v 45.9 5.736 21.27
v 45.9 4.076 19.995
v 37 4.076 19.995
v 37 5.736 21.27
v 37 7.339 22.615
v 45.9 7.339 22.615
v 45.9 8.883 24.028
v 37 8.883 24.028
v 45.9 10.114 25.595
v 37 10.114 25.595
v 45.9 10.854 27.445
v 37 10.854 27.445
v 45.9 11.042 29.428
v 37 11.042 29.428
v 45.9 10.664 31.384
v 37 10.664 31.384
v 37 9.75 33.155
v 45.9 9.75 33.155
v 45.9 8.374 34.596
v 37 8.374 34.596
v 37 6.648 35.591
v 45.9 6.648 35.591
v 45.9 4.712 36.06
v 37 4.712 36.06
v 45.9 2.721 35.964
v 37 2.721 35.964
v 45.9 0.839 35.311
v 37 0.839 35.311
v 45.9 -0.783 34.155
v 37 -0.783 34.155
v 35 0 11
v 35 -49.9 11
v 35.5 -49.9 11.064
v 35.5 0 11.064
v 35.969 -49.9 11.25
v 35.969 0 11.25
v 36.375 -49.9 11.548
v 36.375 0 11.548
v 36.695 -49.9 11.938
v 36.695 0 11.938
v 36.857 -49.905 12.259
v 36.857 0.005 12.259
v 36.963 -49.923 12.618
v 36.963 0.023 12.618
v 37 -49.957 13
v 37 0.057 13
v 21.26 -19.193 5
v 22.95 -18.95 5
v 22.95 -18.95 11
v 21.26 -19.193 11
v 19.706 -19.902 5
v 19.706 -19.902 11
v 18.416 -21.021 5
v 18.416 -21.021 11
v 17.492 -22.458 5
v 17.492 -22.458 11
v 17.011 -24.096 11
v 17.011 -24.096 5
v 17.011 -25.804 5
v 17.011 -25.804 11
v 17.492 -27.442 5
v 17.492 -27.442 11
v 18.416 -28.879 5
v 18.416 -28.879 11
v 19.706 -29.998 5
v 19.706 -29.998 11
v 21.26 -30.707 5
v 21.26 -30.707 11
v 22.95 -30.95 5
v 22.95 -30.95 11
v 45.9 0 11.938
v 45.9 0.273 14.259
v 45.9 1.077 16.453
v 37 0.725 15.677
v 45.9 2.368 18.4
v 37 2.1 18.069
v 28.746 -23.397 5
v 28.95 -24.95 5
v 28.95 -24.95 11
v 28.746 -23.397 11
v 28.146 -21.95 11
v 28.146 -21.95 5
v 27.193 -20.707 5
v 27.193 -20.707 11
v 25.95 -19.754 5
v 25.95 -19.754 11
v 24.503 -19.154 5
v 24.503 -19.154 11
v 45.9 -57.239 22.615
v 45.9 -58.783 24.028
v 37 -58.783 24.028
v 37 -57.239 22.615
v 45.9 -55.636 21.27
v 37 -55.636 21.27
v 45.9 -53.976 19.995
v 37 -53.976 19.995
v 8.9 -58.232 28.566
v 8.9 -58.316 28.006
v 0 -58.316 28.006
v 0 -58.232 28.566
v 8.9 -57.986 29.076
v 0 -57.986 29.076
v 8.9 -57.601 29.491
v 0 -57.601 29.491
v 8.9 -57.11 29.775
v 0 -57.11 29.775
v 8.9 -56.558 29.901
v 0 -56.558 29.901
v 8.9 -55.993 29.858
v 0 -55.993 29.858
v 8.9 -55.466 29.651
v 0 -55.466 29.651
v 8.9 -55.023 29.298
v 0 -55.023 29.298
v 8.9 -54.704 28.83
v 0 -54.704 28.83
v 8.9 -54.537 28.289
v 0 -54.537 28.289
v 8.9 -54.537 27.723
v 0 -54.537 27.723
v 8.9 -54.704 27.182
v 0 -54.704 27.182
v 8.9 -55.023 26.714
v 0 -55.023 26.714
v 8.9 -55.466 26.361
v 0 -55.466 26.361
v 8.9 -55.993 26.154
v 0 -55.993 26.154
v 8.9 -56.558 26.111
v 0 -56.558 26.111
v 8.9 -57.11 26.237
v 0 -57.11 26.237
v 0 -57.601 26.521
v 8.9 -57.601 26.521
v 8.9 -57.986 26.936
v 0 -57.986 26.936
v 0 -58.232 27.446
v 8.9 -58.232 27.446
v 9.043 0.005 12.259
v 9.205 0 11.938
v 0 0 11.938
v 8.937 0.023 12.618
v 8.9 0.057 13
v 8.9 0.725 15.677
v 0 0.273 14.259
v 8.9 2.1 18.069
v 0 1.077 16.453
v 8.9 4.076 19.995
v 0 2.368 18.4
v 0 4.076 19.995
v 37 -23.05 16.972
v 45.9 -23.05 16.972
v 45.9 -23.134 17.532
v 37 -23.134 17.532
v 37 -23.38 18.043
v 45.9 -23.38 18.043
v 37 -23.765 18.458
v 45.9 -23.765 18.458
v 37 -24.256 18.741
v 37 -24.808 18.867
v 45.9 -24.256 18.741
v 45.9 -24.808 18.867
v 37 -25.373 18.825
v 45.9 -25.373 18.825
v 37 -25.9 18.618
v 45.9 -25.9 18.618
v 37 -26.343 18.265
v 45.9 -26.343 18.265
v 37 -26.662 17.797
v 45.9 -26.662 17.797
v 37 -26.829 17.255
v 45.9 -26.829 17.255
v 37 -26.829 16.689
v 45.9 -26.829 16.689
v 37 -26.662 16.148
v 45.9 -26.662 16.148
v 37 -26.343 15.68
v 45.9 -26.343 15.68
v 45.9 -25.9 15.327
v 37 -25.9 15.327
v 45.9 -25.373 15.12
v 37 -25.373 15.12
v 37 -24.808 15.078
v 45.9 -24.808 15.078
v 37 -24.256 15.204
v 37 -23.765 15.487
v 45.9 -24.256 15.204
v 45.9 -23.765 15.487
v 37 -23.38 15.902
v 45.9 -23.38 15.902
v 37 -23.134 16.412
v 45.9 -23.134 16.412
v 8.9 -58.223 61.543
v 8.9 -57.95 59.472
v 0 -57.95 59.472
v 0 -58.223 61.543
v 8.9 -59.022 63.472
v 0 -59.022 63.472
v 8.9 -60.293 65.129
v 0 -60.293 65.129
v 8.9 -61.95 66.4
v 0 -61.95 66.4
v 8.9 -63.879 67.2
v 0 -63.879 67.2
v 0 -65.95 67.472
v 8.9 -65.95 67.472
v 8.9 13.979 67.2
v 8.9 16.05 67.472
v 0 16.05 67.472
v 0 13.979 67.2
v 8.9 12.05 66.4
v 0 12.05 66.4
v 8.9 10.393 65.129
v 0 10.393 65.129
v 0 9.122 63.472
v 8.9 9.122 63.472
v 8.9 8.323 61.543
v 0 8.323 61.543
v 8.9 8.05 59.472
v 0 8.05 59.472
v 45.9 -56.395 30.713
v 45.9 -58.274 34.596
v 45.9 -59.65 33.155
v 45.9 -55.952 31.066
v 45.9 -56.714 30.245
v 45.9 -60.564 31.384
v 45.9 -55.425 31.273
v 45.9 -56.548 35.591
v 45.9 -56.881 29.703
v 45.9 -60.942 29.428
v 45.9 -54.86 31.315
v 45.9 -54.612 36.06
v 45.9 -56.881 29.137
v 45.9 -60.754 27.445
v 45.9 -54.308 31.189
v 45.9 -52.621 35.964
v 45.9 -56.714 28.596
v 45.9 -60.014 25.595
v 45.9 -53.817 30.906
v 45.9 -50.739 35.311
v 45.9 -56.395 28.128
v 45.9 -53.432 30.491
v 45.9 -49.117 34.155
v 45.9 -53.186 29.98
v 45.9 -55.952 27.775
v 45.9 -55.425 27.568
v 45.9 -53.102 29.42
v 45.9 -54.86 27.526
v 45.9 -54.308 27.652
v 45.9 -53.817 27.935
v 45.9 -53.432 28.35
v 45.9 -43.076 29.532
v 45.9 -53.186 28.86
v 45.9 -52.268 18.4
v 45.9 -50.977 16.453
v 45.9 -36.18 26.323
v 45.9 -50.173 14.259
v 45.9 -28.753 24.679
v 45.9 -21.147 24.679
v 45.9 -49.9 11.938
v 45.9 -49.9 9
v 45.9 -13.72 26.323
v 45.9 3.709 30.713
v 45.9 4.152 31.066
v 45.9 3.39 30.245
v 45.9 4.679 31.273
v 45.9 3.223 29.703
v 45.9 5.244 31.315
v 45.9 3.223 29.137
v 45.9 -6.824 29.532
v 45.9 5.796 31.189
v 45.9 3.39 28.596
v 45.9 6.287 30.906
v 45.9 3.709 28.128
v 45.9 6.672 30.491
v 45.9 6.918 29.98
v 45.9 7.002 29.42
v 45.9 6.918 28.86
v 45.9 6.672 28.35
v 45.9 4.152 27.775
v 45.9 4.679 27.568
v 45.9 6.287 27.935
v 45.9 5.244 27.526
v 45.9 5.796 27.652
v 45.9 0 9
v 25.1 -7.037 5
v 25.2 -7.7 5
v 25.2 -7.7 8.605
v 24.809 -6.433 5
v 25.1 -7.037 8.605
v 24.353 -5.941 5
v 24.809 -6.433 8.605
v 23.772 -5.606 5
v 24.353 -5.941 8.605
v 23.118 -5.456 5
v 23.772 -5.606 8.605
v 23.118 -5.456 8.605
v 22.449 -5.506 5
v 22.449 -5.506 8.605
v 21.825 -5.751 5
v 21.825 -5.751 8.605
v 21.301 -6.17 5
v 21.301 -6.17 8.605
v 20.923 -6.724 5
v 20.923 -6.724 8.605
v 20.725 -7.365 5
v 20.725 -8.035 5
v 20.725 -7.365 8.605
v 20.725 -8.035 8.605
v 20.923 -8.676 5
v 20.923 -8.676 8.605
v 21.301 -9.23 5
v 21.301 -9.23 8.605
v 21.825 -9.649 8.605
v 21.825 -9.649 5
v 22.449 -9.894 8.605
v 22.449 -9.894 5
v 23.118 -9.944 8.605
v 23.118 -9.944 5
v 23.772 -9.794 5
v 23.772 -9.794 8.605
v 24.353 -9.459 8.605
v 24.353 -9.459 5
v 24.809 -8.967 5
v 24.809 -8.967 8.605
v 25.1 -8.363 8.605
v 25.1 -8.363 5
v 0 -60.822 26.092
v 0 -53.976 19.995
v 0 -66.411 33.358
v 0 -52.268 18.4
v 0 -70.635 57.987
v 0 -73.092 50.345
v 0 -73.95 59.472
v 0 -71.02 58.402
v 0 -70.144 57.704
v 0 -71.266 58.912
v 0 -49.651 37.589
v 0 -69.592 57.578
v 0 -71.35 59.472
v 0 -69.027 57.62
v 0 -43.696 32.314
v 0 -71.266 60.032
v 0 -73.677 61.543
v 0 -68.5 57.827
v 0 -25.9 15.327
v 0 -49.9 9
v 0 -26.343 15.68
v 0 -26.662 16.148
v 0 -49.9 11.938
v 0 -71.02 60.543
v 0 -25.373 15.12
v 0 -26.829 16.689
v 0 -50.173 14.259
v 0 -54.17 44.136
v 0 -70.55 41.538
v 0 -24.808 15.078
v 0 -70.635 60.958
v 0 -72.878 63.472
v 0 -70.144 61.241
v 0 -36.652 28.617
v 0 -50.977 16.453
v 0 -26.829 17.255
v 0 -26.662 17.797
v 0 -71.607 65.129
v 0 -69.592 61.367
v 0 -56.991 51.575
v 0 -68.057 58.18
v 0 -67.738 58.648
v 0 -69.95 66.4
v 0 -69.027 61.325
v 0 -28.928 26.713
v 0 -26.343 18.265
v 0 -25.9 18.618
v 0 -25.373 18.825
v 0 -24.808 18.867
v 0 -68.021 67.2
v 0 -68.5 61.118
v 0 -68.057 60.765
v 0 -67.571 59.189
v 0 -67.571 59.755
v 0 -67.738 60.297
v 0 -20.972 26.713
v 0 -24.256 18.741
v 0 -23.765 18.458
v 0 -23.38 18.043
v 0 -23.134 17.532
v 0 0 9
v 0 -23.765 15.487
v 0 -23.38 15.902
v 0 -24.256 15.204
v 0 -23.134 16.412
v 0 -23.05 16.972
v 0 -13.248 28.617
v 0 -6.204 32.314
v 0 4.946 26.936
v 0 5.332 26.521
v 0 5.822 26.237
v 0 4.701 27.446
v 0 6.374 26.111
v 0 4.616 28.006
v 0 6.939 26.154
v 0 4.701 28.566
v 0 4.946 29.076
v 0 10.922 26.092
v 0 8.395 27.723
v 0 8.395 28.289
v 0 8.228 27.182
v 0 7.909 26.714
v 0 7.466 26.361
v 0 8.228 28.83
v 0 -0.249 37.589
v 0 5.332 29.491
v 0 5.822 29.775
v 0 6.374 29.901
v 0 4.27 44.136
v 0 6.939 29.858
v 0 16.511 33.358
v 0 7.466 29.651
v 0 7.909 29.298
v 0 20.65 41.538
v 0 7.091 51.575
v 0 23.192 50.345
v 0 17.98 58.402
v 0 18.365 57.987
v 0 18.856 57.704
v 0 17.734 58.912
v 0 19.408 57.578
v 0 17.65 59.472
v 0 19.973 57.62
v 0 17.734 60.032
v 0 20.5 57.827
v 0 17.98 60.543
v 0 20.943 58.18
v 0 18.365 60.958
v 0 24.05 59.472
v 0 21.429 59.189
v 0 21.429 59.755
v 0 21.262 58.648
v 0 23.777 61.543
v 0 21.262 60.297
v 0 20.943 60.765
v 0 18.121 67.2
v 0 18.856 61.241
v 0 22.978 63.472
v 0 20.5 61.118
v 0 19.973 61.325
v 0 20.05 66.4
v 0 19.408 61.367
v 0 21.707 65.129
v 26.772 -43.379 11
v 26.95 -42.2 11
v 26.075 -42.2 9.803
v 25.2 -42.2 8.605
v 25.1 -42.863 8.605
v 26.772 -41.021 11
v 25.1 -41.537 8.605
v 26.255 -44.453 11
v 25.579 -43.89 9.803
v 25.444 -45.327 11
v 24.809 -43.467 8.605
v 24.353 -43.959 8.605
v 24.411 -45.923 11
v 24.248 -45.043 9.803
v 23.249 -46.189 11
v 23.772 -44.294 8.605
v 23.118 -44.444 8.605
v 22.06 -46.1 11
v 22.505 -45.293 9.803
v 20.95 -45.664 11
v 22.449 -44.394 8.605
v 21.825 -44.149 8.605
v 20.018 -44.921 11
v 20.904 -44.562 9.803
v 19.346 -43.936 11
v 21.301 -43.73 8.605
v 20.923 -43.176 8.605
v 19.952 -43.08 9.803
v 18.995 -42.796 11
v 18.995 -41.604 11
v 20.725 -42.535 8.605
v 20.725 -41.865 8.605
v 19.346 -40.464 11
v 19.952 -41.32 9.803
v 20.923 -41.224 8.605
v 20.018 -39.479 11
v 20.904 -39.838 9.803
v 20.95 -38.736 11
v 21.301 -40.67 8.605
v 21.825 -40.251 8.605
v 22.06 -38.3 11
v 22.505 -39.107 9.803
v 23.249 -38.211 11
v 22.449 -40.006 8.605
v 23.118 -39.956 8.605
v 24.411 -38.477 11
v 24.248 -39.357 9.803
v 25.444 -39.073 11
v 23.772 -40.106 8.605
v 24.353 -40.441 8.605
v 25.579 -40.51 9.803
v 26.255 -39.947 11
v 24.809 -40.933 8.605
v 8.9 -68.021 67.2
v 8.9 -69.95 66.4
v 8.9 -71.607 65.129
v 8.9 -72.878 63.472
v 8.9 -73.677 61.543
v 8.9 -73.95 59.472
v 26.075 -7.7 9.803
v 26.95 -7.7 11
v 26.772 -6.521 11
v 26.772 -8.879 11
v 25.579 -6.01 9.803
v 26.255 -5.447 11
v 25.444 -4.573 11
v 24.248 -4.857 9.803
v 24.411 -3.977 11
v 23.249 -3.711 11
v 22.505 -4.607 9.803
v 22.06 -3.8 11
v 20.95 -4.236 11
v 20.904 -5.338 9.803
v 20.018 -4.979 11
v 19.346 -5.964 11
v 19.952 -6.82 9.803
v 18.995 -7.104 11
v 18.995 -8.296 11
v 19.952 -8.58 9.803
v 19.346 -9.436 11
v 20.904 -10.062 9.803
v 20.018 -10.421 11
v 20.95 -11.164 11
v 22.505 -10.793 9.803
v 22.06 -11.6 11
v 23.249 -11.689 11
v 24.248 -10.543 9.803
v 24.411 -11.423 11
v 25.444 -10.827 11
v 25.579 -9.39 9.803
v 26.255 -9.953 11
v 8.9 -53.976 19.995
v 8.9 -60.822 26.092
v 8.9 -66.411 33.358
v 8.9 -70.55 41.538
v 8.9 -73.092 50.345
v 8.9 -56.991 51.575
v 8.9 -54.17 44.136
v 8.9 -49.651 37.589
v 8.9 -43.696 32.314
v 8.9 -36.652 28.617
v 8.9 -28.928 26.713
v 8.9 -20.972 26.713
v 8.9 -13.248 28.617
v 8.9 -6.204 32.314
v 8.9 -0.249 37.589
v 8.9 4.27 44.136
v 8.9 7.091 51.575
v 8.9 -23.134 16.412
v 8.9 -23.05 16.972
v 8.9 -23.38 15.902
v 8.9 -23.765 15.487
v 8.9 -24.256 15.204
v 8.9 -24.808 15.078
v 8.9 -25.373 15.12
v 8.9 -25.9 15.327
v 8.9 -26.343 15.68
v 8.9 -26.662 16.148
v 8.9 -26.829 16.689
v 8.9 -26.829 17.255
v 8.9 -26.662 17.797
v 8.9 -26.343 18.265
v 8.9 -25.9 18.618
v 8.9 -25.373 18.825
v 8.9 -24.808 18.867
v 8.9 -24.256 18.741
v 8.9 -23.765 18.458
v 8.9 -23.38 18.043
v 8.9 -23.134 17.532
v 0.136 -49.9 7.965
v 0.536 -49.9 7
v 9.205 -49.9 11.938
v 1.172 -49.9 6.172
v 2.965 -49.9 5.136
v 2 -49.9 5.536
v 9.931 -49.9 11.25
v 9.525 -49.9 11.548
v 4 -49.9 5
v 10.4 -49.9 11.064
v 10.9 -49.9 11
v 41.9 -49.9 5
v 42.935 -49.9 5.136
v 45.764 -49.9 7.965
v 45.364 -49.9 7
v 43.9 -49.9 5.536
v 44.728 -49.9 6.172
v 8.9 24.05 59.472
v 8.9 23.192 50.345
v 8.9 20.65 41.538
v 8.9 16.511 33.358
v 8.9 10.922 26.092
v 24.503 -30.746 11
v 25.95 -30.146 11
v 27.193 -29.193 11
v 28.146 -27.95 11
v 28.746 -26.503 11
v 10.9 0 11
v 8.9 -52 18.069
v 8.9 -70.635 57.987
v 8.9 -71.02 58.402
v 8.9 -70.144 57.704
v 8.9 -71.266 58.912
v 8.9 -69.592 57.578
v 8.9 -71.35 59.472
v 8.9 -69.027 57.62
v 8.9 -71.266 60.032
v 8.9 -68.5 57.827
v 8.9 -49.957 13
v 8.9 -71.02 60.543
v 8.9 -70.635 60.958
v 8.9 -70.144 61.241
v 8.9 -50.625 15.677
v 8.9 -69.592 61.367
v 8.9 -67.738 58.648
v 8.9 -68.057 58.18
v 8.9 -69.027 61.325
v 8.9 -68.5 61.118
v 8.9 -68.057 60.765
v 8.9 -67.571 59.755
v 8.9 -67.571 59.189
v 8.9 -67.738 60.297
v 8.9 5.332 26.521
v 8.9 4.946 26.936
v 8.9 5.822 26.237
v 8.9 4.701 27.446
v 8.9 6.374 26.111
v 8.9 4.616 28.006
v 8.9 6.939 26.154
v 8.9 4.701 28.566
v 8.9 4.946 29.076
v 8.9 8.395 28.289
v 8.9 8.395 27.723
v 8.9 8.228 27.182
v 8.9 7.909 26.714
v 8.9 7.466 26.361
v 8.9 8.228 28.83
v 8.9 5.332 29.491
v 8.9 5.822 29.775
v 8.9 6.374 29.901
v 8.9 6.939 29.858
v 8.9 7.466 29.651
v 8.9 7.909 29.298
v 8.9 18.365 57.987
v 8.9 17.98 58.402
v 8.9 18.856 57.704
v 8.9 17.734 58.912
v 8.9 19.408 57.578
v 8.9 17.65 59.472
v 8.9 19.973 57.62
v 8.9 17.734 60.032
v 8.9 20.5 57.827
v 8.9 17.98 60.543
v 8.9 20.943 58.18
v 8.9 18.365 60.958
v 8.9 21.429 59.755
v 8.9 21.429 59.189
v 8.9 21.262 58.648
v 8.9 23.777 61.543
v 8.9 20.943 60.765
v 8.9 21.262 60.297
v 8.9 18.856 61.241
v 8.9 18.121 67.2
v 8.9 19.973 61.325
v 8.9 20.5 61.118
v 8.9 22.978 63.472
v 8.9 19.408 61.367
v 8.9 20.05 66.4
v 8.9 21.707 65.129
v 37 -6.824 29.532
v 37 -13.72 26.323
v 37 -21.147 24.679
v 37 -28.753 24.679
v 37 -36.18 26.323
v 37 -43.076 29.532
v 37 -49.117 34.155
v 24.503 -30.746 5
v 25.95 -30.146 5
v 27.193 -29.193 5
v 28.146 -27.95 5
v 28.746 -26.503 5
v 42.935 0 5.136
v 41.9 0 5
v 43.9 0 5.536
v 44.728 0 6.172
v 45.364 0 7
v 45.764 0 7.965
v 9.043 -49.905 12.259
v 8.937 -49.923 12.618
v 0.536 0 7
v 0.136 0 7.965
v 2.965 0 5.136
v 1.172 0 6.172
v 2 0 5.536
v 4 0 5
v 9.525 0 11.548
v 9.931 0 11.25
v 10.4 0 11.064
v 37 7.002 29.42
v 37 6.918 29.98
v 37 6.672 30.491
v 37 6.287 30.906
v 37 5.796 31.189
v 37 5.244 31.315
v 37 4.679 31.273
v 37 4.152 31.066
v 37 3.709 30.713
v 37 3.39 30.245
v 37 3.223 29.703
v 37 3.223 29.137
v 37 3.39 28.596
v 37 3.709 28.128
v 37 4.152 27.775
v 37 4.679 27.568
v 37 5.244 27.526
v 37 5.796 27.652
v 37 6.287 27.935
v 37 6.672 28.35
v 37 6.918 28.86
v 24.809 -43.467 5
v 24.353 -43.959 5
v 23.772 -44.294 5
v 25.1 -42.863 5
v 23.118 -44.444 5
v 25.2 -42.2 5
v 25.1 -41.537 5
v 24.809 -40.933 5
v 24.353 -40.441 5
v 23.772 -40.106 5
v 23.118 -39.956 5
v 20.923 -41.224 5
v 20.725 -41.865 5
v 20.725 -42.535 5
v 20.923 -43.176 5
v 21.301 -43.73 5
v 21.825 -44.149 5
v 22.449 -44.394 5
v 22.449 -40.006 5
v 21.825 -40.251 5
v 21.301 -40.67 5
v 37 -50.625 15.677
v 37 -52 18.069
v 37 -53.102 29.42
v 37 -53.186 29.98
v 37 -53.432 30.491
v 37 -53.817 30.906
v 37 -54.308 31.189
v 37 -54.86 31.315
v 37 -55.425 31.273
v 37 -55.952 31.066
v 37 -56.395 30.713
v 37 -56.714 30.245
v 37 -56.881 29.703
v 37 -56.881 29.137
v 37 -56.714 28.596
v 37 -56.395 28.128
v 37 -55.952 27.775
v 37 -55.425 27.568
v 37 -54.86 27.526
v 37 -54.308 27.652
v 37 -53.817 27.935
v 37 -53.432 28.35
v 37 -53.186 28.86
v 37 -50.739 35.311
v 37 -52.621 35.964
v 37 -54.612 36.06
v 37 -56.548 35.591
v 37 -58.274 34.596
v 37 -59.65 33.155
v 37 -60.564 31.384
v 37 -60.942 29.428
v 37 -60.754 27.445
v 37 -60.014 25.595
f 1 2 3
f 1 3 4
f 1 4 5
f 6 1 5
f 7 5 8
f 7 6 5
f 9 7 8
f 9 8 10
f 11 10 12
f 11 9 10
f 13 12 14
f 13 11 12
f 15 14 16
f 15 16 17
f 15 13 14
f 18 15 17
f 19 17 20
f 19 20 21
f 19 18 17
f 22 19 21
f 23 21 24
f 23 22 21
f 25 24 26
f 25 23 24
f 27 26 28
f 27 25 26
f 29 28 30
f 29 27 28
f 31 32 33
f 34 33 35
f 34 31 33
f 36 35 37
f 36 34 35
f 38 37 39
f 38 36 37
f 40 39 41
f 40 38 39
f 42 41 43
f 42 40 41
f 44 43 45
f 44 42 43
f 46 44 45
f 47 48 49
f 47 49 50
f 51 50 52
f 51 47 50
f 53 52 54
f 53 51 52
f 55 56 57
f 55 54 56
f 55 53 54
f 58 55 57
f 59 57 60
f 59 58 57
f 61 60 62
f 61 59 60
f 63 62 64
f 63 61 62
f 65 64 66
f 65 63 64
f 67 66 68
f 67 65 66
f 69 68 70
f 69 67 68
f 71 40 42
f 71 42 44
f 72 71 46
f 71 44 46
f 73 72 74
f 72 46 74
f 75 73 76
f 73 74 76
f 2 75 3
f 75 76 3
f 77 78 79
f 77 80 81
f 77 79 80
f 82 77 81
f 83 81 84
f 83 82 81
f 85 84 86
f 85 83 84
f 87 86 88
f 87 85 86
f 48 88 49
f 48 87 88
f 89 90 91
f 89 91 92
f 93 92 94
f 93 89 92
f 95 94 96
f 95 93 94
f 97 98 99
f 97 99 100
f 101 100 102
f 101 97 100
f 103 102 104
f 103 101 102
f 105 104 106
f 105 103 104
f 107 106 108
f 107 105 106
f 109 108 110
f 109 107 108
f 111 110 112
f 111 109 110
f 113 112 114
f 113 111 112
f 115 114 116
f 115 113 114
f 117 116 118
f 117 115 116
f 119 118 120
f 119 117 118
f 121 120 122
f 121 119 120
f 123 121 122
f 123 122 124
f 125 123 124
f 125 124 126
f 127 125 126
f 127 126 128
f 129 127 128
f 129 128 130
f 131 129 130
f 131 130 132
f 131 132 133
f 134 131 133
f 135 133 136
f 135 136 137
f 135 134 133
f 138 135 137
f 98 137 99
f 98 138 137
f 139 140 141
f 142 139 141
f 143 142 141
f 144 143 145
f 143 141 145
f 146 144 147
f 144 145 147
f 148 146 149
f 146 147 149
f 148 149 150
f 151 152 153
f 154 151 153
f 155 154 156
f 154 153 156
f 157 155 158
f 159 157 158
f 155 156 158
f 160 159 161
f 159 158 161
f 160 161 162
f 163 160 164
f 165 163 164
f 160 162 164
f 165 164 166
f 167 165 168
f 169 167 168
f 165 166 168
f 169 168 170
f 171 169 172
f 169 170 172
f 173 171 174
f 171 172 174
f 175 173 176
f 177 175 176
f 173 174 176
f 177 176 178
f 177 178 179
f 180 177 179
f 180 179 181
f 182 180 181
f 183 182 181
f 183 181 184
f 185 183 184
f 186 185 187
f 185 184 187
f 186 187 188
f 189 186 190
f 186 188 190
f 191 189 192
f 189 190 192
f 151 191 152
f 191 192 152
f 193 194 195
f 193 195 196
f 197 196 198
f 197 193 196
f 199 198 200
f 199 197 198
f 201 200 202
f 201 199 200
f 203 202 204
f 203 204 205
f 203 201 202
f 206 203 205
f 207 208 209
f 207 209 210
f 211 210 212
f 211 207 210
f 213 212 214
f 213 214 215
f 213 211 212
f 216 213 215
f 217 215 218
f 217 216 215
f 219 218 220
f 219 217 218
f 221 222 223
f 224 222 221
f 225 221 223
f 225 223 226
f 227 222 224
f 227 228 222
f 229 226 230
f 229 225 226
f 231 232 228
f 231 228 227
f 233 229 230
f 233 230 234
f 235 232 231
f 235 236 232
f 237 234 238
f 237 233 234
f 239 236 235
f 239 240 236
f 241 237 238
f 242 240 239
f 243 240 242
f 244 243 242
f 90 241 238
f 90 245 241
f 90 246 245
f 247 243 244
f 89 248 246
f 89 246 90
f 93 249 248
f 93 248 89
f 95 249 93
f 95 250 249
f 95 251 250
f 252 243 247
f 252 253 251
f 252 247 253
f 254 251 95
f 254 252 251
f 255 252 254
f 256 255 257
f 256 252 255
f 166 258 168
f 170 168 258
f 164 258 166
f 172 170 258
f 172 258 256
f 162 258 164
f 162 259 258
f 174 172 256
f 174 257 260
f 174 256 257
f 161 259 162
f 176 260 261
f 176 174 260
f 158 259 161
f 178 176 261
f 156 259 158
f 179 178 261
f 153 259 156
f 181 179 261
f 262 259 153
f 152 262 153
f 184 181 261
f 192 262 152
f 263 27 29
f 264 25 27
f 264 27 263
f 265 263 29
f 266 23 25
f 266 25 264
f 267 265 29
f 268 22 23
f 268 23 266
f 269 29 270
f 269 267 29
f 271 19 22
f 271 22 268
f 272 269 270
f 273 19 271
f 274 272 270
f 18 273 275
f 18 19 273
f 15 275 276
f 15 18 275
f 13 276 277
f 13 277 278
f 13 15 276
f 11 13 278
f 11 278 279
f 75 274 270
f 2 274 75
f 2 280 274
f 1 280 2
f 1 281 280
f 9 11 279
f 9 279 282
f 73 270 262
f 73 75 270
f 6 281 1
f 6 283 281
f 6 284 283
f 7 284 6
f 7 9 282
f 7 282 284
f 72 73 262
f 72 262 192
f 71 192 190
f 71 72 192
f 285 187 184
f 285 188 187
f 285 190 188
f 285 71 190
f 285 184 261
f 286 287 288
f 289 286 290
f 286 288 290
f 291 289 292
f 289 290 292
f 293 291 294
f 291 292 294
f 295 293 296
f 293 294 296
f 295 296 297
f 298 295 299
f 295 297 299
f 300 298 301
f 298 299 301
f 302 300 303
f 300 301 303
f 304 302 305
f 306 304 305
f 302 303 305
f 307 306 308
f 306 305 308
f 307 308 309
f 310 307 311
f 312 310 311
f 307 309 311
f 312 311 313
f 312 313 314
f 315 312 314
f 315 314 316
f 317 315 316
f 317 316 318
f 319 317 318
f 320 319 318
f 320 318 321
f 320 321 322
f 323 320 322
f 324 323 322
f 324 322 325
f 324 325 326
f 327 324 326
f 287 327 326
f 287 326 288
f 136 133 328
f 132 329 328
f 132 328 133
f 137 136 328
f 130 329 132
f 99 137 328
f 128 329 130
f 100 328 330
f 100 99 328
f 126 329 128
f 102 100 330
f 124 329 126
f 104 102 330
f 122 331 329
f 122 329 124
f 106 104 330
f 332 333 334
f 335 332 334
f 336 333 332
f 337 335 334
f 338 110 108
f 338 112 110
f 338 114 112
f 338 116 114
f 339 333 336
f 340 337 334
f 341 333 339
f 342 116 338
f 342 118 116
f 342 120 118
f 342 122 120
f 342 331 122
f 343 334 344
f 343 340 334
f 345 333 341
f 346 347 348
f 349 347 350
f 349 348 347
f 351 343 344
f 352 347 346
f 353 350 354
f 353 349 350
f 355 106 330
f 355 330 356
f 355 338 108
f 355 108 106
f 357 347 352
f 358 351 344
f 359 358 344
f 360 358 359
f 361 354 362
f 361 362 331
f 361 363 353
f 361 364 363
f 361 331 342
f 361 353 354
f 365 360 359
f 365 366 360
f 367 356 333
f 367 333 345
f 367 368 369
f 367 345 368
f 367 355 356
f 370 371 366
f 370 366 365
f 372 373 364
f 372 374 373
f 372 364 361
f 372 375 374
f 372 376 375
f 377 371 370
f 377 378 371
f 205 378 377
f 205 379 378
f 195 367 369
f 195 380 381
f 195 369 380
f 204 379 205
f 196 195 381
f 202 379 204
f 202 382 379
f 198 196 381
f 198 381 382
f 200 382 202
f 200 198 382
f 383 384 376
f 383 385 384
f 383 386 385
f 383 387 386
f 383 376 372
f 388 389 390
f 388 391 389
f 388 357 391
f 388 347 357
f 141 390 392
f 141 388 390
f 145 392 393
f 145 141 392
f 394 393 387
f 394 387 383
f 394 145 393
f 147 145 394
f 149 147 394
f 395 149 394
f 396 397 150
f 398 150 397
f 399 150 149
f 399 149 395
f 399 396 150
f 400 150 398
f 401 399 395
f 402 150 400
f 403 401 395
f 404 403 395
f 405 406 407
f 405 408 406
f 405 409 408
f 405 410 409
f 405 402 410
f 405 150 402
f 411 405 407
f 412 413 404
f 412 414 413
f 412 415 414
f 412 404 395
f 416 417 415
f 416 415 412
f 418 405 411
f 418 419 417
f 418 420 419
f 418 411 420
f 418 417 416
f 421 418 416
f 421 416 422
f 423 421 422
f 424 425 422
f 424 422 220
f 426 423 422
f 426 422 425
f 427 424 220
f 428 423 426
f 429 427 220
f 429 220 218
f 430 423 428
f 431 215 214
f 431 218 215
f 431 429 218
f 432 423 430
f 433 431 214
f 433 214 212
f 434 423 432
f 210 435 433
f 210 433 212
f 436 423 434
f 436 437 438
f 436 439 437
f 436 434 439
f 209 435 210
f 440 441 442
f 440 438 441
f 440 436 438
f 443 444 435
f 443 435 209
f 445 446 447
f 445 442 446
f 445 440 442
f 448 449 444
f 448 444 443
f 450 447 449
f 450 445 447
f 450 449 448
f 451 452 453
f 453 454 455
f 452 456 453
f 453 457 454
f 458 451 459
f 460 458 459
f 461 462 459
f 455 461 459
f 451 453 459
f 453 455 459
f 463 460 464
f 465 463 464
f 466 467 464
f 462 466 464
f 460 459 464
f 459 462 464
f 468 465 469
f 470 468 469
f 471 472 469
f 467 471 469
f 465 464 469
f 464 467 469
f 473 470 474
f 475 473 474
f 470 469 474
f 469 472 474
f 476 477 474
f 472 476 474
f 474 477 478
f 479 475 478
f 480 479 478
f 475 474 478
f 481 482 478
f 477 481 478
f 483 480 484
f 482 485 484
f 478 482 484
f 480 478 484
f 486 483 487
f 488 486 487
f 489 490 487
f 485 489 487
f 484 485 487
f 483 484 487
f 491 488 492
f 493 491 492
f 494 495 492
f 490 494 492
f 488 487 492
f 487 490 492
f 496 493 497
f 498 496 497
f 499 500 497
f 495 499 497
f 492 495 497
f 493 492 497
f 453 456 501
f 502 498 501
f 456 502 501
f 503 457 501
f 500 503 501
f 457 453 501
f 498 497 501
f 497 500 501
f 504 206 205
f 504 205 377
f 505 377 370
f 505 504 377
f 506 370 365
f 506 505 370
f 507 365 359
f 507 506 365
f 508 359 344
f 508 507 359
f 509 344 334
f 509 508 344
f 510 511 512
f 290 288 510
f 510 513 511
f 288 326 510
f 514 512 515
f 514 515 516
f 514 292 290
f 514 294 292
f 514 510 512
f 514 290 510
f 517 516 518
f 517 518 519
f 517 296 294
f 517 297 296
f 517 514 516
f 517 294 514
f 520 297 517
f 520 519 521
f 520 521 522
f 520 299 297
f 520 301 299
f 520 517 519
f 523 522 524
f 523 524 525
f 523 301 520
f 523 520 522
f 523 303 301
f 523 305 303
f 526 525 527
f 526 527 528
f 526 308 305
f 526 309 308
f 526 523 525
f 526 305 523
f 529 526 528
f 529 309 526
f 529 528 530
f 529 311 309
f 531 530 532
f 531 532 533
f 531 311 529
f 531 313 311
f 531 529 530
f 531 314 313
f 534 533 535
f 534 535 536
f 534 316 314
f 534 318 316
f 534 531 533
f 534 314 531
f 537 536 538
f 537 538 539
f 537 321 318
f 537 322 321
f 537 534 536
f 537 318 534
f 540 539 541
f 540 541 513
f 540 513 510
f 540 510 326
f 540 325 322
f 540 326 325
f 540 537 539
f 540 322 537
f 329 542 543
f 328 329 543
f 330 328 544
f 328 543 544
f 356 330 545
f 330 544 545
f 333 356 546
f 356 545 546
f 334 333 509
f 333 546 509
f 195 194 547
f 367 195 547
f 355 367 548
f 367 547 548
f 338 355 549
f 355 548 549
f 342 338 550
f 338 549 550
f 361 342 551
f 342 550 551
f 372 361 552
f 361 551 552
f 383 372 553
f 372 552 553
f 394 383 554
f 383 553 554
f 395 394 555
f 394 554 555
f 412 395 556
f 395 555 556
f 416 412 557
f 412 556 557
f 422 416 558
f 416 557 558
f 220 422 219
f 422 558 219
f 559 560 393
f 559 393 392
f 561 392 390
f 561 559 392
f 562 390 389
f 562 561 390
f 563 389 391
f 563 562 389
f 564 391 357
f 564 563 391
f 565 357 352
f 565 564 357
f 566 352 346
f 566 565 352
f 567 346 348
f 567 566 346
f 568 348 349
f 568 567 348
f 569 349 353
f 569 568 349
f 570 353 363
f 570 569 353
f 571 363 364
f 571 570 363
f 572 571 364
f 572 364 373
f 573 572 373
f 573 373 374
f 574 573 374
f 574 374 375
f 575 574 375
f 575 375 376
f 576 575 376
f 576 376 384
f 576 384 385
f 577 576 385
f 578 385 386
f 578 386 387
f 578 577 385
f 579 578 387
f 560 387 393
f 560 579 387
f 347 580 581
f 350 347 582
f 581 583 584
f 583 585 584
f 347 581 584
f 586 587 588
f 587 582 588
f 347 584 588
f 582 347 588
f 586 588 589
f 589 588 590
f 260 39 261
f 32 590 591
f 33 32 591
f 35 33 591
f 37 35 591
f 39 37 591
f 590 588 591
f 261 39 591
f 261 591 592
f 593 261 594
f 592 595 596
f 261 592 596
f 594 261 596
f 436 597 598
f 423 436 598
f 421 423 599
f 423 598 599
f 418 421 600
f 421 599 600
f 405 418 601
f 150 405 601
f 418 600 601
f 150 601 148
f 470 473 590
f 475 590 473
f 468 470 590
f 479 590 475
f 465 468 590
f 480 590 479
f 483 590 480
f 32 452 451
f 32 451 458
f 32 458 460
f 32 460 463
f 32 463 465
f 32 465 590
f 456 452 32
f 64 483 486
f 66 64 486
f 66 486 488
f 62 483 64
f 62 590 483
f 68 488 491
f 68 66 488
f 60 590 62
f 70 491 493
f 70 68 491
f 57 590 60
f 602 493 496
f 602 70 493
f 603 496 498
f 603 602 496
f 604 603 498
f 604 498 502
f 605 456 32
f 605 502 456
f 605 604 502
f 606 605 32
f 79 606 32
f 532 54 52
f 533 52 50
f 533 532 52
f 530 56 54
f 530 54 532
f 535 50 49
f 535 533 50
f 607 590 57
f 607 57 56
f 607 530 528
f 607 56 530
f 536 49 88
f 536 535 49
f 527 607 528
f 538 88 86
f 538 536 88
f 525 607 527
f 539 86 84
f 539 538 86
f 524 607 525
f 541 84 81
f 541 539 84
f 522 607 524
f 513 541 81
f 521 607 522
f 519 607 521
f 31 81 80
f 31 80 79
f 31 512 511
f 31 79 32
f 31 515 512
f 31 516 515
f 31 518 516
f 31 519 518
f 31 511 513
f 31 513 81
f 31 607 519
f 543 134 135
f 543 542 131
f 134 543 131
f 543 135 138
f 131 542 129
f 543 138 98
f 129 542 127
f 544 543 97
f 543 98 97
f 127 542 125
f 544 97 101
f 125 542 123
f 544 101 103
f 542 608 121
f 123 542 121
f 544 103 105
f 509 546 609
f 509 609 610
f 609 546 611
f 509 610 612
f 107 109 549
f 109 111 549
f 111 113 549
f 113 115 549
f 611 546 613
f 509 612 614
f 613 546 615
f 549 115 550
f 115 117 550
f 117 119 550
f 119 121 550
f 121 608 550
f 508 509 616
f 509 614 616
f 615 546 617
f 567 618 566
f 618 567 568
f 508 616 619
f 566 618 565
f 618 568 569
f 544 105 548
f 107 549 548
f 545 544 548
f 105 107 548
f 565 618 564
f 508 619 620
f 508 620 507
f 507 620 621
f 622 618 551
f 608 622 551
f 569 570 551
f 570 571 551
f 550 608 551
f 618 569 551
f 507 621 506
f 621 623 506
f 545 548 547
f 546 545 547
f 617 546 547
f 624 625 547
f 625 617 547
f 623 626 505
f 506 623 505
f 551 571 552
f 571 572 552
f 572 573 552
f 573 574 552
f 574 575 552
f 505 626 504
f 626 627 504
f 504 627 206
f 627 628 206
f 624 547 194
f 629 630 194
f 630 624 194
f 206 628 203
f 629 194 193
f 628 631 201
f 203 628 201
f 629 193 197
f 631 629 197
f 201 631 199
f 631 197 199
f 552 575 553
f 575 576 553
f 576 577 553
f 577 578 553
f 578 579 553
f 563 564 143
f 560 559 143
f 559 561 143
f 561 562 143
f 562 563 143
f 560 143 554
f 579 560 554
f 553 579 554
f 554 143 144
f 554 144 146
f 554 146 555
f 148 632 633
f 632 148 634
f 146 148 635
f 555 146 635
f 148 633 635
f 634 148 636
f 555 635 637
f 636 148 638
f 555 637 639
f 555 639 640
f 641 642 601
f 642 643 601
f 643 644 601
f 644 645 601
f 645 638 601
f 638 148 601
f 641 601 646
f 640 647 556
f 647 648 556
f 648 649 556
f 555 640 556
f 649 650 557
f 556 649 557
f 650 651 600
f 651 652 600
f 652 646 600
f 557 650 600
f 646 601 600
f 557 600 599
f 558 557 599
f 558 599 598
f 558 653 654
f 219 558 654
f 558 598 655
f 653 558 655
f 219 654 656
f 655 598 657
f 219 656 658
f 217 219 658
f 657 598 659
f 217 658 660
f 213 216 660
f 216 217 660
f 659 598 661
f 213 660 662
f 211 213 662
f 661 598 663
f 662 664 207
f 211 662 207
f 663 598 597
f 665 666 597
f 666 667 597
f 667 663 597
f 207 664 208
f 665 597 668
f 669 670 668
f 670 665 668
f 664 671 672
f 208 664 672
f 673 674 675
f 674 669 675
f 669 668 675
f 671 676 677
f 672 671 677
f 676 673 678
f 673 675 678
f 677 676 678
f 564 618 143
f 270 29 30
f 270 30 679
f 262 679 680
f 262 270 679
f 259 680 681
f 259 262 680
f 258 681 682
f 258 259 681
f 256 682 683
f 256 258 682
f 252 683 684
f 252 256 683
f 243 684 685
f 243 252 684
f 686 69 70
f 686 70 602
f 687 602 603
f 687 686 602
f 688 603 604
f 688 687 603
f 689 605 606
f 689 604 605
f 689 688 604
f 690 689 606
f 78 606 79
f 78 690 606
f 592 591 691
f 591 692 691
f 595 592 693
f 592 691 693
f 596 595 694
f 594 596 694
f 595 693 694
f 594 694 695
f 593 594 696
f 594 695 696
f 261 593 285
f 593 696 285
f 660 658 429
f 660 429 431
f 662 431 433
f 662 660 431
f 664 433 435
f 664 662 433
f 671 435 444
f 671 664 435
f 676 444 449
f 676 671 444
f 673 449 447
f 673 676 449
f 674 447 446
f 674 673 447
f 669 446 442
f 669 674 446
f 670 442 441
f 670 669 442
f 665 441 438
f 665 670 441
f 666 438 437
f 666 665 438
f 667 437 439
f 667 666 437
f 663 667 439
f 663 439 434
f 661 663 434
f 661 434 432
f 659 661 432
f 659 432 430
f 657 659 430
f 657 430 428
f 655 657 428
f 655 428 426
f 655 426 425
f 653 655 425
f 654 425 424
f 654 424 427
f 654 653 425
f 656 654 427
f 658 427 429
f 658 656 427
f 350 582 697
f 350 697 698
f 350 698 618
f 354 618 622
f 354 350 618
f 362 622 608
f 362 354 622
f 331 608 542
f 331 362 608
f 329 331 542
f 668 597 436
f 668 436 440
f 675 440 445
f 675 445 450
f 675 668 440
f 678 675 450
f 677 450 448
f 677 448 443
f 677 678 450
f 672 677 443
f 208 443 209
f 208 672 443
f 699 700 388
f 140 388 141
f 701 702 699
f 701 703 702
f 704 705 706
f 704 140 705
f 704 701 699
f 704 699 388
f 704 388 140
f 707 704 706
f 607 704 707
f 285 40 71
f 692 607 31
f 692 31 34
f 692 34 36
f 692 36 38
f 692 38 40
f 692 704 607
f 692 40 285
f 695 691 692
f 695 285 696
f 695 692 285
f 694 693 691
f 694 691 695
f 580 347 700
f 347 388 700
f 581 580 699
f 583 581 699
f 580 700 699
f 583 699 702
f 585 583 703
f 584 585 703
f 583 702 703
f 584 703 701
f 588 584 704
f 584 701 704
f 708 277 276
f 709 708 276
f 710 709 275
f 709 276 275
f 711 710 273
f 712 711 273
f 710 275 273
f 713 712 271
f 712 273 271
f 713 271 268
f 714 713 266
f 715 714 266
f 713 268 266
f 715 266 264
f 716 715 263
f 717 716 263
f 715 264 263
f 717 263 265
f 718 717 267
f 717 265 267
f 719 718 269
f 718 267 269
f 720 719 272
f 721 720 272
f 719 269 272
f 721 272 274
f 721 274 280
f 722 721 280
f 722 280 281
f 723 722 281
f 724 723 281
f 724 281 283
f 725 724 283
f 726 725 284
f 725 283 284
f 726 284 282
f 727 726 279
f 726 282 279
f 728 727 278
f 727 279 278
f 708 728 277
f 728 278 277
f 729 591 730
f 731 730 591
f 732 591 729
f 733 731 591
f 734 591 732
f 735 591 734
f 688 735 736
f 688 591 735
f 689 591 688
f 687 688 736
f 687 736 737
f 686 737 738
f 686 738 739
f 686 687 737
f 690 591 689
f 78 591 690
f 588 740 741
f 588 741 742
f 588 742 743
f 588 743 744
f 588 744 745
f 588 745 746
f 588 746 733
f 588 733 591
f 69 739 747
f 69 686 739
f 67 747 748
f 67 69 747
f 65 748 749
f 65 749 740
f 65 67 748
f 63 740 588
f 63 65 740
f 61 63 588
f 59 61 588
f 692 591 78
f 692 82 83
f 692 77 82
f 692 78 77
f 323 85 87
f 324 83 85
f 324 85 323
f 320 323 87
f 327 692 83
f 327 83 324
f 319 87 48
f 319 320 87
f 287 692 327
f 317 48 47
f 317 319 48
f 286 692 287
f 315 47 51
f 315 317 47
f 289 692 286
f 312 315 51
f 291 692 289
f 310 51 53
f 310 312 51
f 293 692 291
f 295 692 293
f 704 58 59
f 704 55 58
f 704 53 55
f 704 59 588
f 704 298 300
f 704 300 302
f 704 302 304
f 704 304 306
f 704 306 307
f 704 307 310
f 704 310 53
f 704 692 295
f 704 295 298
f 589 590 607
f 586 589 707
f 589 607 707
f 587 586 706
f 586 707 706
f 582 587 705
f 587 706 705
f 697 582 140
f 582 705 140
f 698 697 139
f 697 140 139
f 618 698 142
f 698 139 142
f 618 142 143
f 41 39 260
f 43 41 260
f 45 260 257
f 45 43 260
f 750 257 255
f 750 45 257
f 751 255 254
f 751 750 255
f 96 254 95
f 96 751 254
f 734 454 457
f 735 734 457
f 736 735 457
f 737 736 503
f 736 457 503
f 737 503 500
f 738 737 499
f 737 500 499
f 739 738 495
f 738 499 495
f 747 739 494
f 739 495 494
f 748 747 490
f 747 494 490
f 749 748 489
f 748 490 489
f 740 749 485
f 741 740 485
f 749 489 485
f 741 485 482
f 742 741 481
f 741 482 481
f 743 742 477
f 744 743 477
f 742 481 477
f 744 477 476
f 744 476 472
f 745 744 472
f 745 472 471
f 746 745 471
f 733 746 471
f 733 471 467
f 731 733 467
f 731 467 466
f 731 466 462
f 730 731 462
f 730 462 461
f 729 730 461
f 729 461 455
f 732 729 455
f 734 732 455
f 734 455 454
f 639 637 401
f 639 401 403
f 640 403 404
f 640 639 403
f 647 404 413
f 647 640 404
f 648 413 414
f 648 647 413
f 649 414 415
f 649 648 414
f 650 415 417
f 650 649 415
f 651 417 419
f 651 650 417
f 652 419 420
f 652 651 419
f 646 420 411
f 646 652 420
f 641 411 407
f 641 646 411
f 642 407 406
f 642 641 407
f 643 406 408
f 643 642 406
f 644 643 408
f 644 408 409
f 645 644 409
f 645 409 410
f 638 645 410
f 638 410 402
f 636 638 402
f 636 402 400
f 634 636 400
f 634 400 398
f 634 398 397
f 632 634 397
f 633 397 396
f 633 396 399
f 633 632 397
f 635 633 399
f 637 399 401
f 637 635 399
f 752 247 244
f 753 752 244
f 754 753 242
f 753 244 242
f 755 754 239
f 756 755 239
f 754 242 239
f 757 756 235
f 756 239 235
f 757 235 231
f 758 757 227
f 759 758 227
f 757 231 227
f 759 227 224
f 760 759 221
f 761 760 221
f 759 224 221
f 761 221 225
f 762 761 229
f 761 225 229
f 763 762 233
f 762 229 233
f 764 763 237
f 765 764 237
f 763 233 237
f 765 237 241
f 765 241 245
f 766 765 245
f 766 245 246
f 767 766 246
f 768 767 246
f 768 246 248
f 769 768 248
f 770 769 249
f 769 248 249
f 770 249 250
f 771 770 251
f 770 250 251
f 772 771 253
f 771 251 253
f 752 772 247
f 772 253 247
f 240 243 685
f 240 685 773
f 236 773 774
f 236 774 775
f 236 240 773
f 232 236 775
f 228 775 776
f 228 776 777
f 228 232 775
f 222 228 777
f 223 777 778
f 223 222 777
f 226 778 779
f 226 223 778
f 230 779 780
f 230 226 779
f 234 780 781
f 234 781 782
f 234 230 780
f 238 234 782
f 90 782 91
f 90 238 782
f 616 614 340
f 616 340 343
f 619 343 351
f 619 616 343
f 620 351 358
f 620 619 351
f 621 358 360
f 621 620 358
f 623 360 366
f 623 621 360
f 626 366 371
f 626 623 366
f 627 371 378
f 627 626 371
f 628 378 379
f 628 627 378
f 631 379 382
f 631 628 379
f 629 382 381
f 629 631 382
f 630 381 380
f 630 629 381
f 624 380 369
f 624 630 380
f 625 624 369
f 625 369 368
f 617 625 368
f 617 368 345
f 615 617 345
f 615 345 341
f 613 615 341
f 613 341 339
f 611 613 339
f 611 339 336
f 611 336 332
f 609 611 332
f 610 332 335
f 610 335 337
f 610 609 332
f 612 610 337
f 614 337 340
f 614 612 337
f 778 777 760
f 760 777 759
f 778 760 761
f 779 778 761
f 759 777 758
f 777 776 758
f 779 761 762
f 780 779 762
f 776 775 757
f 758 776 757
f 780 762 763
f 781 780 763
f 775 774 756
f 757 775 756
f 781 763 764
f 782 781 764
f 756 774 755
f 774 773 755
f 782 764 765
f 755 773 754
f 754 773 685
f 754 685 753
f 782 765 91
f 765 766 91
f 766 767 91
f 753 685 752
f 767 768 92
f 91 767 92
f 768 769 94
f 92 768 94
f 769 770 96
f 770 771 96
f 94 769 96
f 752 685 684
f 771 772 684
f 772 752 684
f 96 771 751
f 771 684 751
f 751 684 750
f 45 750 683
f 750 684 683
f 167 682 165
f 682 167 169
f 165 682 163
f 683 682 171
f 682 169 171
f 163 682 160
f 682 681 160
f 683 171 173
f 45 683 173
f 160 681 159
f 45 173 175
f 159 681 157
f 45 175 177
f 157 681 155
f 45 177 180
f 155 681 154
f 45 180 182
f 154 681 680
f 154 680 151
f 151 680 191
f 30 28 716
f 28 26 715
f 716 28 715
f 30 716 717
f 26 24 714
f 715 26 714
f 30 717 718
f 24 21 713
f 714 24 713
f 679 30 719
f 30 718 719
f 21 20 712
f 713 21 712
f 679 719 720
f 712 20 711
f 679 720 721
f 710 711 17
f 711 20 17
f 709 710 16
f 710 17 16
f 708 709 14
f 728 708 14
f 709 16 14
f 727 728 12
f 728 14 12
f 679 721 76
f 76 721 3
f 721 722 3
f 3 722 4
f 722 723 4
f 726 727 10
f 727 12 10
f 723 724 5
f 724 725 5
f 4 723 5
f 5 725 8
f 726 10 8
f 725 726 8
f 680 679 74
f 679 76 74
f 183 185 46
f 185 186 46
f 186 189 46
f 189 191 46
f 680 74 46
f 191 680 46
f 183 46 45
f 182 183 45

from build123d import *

# Parameters (mm, degrees)
SKETCH_1_W               = 45.9
SKETCH_1_H               = 49.9
EXTRUDE_1_DEPTH          = 6
SKETCH_2_R               = 1.9
EXTRUDE_2_DEPTH          = 8.9
EXTRUDE_START            = -8.9
SKETCH_3_R               = 1.9
EXTRUDE_3_DEPTH          = 8.9
FILLET_3_R               = 10
CUT_EXTRUDE_START        = -10
SKETCH_6_R               = 1.9
CUT_EXTRUDE_2_DEPTH      = 10
SKETCH_7_W               = 45.9
SKETCH_7_H               = 49.9
CUT_EXTRUDE_3_DEPTH      = 5
FILLET_4_R               = 4
SKETCH_8_W               = 28.1
SKETCH_8_H               = 49.9
EXTRUDE_5_DEPTH          = 5
FILLET_5_R               = 2
SKETCH_11_R              = 2.25
CUT_EXTRUDE_4_DEPTH      = 31
CUT_EXTRUDE_1_DEPTH      = 66
CUT_EXTRUDE_1_DEPTH_BACK = 70


with BuildPart() as part:
    # 草图1 → 凸台-拉伸1 (new body)
    with BuildSketch(Plane.XY):
        with Locations((22.95, -24.95)):
            Rectangle(SKETCH_1_W, SKETCH_1_H)
    extrude(amount=EXTRUDE_1_DEPTH)

    # 草图2 → 凸台-拉伸2 (add)
    with BuildSketch(Plane(origin=(45.9, 0, 0), x_dir=(0, 0, -1), z_dir=(1, 0, 0))):
        with BuildLine():
            Line((-6, 0), (-17.3, 0))
            ThreePointArc((-17.3, 0), (-20.410567122, 4.633542967), (-24.02783532, 8.883333436))
            ThreePointArc((-24.02783532, 8.883333436), (-33.92465453, 9.113485719), (-34.154806758, -0.783333492))
            ThreePointArc((-34.154806758, -0.783333492), (-24.472236128, -24.949999926), (-34.154806656, -49.116666401))
            ThreePointArc((-34.154806656, -49.116666401), (-33.924654493, -59.013485754), (-24.027835147, -58.783333255))
            ThreePointArc((-24.027835147, -58.783333255), (-20.410567046, -54.533542867), (-17.3, -49.9))
            Line((-17.3, -49.9), (-6, -49.9))
            Line((-6, -49.9), (-6, 0))
        make_face()
        with Locations(Location((-16.972236128, -24.95, 0), (0, 0, 90))):
            Circle(SKETCH_2_R, mode=Mode.SUBTRACT)
        with Locations(Location((-29.420197927, 5.1020382, 0), (0, 0, 90))):
            Circle(SKETCH_2_R, mode=Mode.SUBTRACT)
        with Locations(Location((-29.420197927, -55.0020382, 0), (0, 0, 90))):
            Circle(SKETCH_2_R, mode=Mode.SUBTRACT)
    extrude(amount=-EXTRUDE_2_DEPTH)

    # 草图3 → 凸台-拉伸3 (add)
    with BuildSketch(Plane.ZY.offset(EXTRUDE_START)):
        with BuildLine():
            Line((6, -49.9), (17.3, -49.9))
            ThreePointArc((17.3, -49.9), (62.08503163, -73.880290206), (104.061658089, -45.267072848))
            ThreePointArc((104.061658089, -45.267072848), (100.098824974, -34.670094153), (89.501846395, -38.63292758))
            ThreePointArc((89.501846395, -38.63292758), (26.472236128, -24.950000045), (89.501846358, -11.267072337))
            ThreePointArc((89.501846358, -11.267072337), (100.09882522, -15.229905735), (104.061657827, -4.632926576))
            ThreePointArc((104.061657827, -4.632926576), (62.085031314, 23.980290223), (17.3, 0))
            Line((17.3, 0), (6, 0))
            Line((6, 0), (6, -49.9))
        make_face()
        with Locations(Location((90.93848789, 6.516251763, 0), (0, 0, 270))):
            Circle(SKETCH_3_R, mode=Mode.SUBTRACT)
        with Locations(Location((28.005984365, -56.416251763, 0), (0, 0, 270))):
            Circle(SKETCH_3_R, mode=Mode.SUBTRACT)
        with Locations(Location((16.972236128, -24.95, 0), (0, 0, 90))):
            Circle(SKETCH_3_R, mode=Mode.SUBTRACT)
        with Locations(Location((59.472236128, -69.45, 0), (0, 0, 270))):
            Circle(SKETCH_3_R, mode=Mode.SUBTRACT)
        with Locations(Location((90.93848789, -56.416251763, 0), (0, 0, 270))):
            Circle(SKETCH_3_R, mode=Mode.SUBTRACT)
        with Locations(Location((28.005984365, 6.516251763, 0), (0, 0, 270))):
            Circle(SKETCH_3_R, mode=Mode.SUBTRACT)
        with Locations(Location((59.472236128, 19.55, 0), (0, 0, 270))):
            Circle(SKETCH_3_R, mode=Mode.SUBTRACT)
    extrude(amount=EXTRUDE_3_DEPTH)

    # 圆角3
    fillet_3_edges = [part.edges().sort_by_distance(p)[0] for p in [
        (41.45, 0, 17.3),
        (41.45, -49.9, 17.3),
        (4.45, -49.9, 17.3),
        (4.45, 0, 17.3),
    ]]
    fillet(fillet_3_edges, radius=FILLET_3_R)

    # 草图6 → 切除-拉伸2 (cut)
    # profile 1 of 2: a face of its own
    with BuildSketch(Plane.ZY.offset(CUT_EXTRUDE_START)):
        with BuildLine():
            ThreePointArc((104.061657942, -4.632926829), (85.981321722, 16.260051941), (59.472232168, 24.05))
            ThreePointArc((59.472232168, 24.05), (65.12908684, 21.706854481), (67.472232822, 16.05))
            ThreePointArc((67.472232822, 16.05), (65.129087169, 10.393145848), (59.472233099, 8.05))
            ThreePointArc((59.472233099, 8.05), (77.32529362, 2.803708548), (89.501846738, -11.267073171))
            ThreePointArc((89.501846738, -11.267073171), (100.098825511, -15.229905602), (104.061657942, -4.632926829))
        make_face()
        with Locations((90.93848789, 6.516251763)):
            Circle(SKETCH_6_R, mode=Mode.SUBTRACT)
    # profile 2 of 2: a face of its own
    with BuildSketch(Plane.ZY.offset(CUT_EXTRUDE_START)):
        with BuildLine():
            ThreePointArc((89.501846738, -38.632926829), (77.325293679, -52.70370851), (59.472233238, -57.95))
            ThreePointArc((59.472233238, -57.95), (65.129087219, -60.293145898), (67.472232822, -65.95))
            ThreePointArc((67.472232822, -65.95), (65.129086835, -71.606854486), (59.472232153, -73.95))
            ThreePointArc((59.472232153, -73.95), (85.981321716, -66.160051945), (104.061657942, -45.267073171))
            ThreePointArc((104.061657942, -45.267073171), (100.098825511, -34.670094398), (89.501846738, -38.632926829))
        make_face()
        with Locations((90.93848789, -56.416251763)):
            Circle(SKETCH_6_R, mode=Mode.SUBTRACT)
    extrude(amount=CUT_EXTRUDE_2_DEPTH, mode=Mode.SUBTRACT)


with BuildPart() as cut_extrude_2_kept_piece:
    # of the separate pieces the step leaves, the one the design keeps (cut_extrude_2_pieces_kept)
    add(part.part.solids().sort_by_distance((0, 0, 11.938064209))[0])

    # 草图7 → 切除-拉伸3 (cut)
    with BuildSketch(Plane(origin=(0, 0, 0), x_dir=(-1, 0, 0), z_dir=(0, 0, -1))):
        with Locations((-22.95, -24.95)):
            Rectangle(SKETCH_7_W, SKETCH_7_H)
    extrude(amount=-CUT_EXTRUDE_3_DEPTH, mode=Mode.SUBTRACT)

    # 圆角4
    fillet_4_edges = [cut_extrude_2_kept_piece.edges().sort_by_distance(p)[0] for p in [
        (45.9, -24.95, 5),
        (0, -24.95, 5),
    ]]
    fillet(fillet_4_edges, radius=FILLET_4_R)

    # 草图8 → 凸台-拉伸5 (add)
    with BuildSketch(Plane.XY.offset(6)):
        with Locations((22.95, -24.95)):
            Rectangle(SKETCH_8_W, SKETCH_8_H)
    extrude(amount=EXTRUDE_5_DEPTH)

    # 圆角5
    fillet_5_edges = [cut_extrude_2_kept_piece.edges().sort_by_distance(p)[0] for p in [
        (37, -24.95, 11),
        (8.9, -24.95, 11),
    ]]
    fillet(fillet_5_edges, radius=FILLET_5_R)

    # 草图11 → 切除-拉伸4 (cut)
    with BuildSketch(Plane.XY.offset(11)):
        with Locations((22.95, -7.7)):
            Circle(SKETCH_11_R)
        with Locations((22.95, -42.2)):
            Circle(SKETCH_11_R)
    extrude(amount=-CUT_EXTRUDE_4_DEPTH, mode=Mode.SUBTRACT)

    # 草图4 → 切除-拉伸1 (cut, two sides: drawn at the far end of the back side and taken through both)
    with BuildSketch(Plane.XY.offset(6).offset(-CUT_EXTRUDE_1_DEPTH_BACK)):
        with BuildLine():
            ThreePointArc((28.95, -24.95), (27.192640687, -20.707359313), (22.95, -18.95))
            Line((22.95, -18.95), (22.95, -30.95))
            ThreePointArc((22.95, -30.95), (27.192640687, -29.192640687), (28.95, -24.95))
        make_face()
        with BuildLine():
            Line((22.95, -30.95), (22.95, -18.95))
            ThreePointArc((22.95, -18.95), (16.95, -24.95), (22.95, -30.95))
        make_face()
    extrude(amount=CUT_EXTRUDE_1_DEPTH + CUT_EXTRUDE_1_DEPTH_BACK, mode=Mode.SUBTRACT)

    # 草图12 → 切除-旋转1 (revolve, cut)
    with BuildSketch(Plane.ZY.offset(-22.95), mode=Mode.PRIVATE) as cut_revolve_1_sk:
        Polygon((8.4, -7.7), (11, -7.7), (11, -5.45), (11, -3.7), (8.4, -5.6), align=None)
    cut_revolve_1 = revolve(cut_revolve_1_sk.sketch.rotate(Axis((22.95, -7.7, 5), (0, 0, 1)), 270), axis=Axis((22.95, -7.7, 5), (0, 0, 1)), mode=Mode.SUBTRACT)

    # 镜向2: 切除-旋转1 across plane
    add(cut_revolve_1.mirror(Plane.ZX.offset(-24.95)), mode=Mode.SUBTRACT)


solid = cut_extrude_2_kept_piece.part
